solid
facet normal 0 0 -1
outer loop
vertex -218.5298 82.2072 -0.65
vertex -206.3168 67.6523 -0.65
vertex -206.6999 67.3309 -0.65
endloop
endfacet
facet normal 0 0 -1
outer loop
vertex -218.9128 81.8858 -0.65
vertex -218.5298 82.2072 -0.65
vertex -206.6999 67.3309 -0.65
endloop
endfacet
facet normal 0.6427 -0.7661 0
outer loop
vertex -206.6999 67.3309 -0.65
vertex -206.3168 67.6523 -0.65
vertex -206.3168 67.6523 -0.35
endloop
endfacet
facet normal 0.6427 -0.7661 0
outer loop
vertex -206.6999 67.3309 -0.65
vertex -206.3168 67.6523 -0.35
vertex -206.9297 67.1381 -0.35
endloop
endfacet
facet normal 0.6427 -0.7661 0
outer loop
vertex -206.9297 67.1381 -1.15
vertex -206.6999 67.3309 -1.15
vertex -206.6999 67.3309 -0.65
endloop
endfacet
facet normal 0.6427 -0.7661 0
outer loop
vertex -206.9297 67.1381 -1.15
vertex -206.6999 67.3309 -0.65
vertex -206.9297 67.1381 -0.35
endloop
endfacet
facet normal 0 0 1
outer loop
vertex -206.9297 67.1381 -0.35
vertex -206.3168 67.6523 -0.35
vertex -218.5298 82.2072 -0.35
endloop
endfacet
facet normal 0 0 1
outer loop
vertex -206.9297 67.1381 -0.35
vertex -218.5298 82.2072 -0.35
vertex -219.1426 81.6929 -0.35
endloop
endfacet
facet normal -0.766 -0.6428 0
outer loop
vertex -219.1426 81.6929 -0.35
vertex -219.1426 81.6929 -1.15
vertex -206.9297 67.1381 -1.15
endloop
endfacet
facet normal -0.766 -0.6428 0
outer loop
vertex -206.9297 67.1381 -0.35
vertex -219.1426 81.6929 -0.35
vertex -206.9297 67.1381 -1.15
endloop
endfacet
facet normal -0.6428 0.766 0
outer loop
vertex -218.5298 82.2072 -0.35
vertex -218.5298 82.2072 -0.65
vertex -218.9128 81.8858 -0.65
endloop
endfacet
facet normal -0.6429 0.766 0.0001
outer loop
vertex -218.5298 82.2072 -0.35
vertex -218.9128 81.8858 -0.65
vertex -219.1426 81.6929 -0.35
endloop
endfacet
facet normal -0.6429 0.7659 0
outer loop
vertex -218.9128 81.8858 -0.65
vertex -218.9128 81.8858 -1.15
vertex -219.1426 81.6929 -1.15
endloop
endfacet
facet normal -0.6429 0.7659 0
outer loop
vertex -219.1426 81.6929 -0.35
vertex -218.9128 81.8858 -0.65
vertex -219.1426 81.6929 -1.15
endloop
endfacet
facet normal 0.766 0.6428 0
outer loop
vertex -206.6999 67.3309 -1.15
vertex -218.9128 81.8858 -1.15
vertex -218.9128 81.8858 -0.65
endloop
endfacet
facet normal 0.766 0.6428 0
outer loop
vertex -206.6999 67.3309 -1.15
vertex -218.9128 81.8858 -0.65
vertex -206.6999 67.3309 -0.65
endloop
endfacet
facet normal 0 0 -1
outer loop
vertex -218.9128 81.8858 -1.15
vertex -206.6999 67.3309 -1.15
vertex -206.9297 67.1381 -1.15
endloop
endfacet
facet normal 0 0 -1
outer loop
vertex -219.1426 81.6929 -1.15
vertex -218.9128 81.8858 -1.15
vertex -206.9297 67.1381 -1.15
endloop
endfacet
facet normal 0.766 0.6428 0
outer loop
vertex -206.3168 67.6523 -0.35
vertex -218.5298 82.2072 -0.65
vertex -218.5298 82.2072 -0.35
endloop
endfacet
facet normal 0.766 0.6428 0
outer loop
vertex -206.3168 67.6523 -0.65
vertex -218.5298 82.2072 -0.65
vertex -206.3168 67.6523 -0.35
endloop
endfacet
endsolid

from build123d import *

# Parameters (mm, degrees)
BOX159_W               = 0.8
BOX159_H               = 19
BOX159_DEPTH           = 0.8
BOX160_W               = 0.8
BOX160_H               = 19
BOX160_DEPTH           = 0.8
CUT083_PLACEMENT_ANGLE = 220


with BuildPart() as cubo159:
    # Box159 → Box159 (new body)
    with BuildSketch(Plane.XY):
        with Locations((0.4, 9.5)):
            Rectangle(BOX159_W, BOX159_H)
    extrude(amount=BOX159_DEPTH)


with BuildPart() as perfil_l_2da_cara025:
    # Box160 → Box160 (new body)
    with BuildSketch(Plane(origin=(0.3, 0, 0.3), x_dir=(1, 0, 0), z_dir=(0, 0, 1))):
        with Locations((0.4, 9.5)):
            Rectangle(BOX160_W, BOX160_H)
    extrude(amount=BOX160_DEPTH)

    # Cut083: cut Cubo159
    add(cubo159.part, mode=Mode.SUBTRACT)


with BuildPart() as perfil_l_2da_cara025_1:
    # Cut083 placement: moved
    add(perfil_l_2da_cara025.part.moved(Location((-218.3, 82.4, -1.45))).rotate(Axis((-218.3, 82.4, -1.45), (0, 0, 1)), CUT083_PLACEMENT_ANGLE))


solid = perfil_l_2da_cara025_1.part
